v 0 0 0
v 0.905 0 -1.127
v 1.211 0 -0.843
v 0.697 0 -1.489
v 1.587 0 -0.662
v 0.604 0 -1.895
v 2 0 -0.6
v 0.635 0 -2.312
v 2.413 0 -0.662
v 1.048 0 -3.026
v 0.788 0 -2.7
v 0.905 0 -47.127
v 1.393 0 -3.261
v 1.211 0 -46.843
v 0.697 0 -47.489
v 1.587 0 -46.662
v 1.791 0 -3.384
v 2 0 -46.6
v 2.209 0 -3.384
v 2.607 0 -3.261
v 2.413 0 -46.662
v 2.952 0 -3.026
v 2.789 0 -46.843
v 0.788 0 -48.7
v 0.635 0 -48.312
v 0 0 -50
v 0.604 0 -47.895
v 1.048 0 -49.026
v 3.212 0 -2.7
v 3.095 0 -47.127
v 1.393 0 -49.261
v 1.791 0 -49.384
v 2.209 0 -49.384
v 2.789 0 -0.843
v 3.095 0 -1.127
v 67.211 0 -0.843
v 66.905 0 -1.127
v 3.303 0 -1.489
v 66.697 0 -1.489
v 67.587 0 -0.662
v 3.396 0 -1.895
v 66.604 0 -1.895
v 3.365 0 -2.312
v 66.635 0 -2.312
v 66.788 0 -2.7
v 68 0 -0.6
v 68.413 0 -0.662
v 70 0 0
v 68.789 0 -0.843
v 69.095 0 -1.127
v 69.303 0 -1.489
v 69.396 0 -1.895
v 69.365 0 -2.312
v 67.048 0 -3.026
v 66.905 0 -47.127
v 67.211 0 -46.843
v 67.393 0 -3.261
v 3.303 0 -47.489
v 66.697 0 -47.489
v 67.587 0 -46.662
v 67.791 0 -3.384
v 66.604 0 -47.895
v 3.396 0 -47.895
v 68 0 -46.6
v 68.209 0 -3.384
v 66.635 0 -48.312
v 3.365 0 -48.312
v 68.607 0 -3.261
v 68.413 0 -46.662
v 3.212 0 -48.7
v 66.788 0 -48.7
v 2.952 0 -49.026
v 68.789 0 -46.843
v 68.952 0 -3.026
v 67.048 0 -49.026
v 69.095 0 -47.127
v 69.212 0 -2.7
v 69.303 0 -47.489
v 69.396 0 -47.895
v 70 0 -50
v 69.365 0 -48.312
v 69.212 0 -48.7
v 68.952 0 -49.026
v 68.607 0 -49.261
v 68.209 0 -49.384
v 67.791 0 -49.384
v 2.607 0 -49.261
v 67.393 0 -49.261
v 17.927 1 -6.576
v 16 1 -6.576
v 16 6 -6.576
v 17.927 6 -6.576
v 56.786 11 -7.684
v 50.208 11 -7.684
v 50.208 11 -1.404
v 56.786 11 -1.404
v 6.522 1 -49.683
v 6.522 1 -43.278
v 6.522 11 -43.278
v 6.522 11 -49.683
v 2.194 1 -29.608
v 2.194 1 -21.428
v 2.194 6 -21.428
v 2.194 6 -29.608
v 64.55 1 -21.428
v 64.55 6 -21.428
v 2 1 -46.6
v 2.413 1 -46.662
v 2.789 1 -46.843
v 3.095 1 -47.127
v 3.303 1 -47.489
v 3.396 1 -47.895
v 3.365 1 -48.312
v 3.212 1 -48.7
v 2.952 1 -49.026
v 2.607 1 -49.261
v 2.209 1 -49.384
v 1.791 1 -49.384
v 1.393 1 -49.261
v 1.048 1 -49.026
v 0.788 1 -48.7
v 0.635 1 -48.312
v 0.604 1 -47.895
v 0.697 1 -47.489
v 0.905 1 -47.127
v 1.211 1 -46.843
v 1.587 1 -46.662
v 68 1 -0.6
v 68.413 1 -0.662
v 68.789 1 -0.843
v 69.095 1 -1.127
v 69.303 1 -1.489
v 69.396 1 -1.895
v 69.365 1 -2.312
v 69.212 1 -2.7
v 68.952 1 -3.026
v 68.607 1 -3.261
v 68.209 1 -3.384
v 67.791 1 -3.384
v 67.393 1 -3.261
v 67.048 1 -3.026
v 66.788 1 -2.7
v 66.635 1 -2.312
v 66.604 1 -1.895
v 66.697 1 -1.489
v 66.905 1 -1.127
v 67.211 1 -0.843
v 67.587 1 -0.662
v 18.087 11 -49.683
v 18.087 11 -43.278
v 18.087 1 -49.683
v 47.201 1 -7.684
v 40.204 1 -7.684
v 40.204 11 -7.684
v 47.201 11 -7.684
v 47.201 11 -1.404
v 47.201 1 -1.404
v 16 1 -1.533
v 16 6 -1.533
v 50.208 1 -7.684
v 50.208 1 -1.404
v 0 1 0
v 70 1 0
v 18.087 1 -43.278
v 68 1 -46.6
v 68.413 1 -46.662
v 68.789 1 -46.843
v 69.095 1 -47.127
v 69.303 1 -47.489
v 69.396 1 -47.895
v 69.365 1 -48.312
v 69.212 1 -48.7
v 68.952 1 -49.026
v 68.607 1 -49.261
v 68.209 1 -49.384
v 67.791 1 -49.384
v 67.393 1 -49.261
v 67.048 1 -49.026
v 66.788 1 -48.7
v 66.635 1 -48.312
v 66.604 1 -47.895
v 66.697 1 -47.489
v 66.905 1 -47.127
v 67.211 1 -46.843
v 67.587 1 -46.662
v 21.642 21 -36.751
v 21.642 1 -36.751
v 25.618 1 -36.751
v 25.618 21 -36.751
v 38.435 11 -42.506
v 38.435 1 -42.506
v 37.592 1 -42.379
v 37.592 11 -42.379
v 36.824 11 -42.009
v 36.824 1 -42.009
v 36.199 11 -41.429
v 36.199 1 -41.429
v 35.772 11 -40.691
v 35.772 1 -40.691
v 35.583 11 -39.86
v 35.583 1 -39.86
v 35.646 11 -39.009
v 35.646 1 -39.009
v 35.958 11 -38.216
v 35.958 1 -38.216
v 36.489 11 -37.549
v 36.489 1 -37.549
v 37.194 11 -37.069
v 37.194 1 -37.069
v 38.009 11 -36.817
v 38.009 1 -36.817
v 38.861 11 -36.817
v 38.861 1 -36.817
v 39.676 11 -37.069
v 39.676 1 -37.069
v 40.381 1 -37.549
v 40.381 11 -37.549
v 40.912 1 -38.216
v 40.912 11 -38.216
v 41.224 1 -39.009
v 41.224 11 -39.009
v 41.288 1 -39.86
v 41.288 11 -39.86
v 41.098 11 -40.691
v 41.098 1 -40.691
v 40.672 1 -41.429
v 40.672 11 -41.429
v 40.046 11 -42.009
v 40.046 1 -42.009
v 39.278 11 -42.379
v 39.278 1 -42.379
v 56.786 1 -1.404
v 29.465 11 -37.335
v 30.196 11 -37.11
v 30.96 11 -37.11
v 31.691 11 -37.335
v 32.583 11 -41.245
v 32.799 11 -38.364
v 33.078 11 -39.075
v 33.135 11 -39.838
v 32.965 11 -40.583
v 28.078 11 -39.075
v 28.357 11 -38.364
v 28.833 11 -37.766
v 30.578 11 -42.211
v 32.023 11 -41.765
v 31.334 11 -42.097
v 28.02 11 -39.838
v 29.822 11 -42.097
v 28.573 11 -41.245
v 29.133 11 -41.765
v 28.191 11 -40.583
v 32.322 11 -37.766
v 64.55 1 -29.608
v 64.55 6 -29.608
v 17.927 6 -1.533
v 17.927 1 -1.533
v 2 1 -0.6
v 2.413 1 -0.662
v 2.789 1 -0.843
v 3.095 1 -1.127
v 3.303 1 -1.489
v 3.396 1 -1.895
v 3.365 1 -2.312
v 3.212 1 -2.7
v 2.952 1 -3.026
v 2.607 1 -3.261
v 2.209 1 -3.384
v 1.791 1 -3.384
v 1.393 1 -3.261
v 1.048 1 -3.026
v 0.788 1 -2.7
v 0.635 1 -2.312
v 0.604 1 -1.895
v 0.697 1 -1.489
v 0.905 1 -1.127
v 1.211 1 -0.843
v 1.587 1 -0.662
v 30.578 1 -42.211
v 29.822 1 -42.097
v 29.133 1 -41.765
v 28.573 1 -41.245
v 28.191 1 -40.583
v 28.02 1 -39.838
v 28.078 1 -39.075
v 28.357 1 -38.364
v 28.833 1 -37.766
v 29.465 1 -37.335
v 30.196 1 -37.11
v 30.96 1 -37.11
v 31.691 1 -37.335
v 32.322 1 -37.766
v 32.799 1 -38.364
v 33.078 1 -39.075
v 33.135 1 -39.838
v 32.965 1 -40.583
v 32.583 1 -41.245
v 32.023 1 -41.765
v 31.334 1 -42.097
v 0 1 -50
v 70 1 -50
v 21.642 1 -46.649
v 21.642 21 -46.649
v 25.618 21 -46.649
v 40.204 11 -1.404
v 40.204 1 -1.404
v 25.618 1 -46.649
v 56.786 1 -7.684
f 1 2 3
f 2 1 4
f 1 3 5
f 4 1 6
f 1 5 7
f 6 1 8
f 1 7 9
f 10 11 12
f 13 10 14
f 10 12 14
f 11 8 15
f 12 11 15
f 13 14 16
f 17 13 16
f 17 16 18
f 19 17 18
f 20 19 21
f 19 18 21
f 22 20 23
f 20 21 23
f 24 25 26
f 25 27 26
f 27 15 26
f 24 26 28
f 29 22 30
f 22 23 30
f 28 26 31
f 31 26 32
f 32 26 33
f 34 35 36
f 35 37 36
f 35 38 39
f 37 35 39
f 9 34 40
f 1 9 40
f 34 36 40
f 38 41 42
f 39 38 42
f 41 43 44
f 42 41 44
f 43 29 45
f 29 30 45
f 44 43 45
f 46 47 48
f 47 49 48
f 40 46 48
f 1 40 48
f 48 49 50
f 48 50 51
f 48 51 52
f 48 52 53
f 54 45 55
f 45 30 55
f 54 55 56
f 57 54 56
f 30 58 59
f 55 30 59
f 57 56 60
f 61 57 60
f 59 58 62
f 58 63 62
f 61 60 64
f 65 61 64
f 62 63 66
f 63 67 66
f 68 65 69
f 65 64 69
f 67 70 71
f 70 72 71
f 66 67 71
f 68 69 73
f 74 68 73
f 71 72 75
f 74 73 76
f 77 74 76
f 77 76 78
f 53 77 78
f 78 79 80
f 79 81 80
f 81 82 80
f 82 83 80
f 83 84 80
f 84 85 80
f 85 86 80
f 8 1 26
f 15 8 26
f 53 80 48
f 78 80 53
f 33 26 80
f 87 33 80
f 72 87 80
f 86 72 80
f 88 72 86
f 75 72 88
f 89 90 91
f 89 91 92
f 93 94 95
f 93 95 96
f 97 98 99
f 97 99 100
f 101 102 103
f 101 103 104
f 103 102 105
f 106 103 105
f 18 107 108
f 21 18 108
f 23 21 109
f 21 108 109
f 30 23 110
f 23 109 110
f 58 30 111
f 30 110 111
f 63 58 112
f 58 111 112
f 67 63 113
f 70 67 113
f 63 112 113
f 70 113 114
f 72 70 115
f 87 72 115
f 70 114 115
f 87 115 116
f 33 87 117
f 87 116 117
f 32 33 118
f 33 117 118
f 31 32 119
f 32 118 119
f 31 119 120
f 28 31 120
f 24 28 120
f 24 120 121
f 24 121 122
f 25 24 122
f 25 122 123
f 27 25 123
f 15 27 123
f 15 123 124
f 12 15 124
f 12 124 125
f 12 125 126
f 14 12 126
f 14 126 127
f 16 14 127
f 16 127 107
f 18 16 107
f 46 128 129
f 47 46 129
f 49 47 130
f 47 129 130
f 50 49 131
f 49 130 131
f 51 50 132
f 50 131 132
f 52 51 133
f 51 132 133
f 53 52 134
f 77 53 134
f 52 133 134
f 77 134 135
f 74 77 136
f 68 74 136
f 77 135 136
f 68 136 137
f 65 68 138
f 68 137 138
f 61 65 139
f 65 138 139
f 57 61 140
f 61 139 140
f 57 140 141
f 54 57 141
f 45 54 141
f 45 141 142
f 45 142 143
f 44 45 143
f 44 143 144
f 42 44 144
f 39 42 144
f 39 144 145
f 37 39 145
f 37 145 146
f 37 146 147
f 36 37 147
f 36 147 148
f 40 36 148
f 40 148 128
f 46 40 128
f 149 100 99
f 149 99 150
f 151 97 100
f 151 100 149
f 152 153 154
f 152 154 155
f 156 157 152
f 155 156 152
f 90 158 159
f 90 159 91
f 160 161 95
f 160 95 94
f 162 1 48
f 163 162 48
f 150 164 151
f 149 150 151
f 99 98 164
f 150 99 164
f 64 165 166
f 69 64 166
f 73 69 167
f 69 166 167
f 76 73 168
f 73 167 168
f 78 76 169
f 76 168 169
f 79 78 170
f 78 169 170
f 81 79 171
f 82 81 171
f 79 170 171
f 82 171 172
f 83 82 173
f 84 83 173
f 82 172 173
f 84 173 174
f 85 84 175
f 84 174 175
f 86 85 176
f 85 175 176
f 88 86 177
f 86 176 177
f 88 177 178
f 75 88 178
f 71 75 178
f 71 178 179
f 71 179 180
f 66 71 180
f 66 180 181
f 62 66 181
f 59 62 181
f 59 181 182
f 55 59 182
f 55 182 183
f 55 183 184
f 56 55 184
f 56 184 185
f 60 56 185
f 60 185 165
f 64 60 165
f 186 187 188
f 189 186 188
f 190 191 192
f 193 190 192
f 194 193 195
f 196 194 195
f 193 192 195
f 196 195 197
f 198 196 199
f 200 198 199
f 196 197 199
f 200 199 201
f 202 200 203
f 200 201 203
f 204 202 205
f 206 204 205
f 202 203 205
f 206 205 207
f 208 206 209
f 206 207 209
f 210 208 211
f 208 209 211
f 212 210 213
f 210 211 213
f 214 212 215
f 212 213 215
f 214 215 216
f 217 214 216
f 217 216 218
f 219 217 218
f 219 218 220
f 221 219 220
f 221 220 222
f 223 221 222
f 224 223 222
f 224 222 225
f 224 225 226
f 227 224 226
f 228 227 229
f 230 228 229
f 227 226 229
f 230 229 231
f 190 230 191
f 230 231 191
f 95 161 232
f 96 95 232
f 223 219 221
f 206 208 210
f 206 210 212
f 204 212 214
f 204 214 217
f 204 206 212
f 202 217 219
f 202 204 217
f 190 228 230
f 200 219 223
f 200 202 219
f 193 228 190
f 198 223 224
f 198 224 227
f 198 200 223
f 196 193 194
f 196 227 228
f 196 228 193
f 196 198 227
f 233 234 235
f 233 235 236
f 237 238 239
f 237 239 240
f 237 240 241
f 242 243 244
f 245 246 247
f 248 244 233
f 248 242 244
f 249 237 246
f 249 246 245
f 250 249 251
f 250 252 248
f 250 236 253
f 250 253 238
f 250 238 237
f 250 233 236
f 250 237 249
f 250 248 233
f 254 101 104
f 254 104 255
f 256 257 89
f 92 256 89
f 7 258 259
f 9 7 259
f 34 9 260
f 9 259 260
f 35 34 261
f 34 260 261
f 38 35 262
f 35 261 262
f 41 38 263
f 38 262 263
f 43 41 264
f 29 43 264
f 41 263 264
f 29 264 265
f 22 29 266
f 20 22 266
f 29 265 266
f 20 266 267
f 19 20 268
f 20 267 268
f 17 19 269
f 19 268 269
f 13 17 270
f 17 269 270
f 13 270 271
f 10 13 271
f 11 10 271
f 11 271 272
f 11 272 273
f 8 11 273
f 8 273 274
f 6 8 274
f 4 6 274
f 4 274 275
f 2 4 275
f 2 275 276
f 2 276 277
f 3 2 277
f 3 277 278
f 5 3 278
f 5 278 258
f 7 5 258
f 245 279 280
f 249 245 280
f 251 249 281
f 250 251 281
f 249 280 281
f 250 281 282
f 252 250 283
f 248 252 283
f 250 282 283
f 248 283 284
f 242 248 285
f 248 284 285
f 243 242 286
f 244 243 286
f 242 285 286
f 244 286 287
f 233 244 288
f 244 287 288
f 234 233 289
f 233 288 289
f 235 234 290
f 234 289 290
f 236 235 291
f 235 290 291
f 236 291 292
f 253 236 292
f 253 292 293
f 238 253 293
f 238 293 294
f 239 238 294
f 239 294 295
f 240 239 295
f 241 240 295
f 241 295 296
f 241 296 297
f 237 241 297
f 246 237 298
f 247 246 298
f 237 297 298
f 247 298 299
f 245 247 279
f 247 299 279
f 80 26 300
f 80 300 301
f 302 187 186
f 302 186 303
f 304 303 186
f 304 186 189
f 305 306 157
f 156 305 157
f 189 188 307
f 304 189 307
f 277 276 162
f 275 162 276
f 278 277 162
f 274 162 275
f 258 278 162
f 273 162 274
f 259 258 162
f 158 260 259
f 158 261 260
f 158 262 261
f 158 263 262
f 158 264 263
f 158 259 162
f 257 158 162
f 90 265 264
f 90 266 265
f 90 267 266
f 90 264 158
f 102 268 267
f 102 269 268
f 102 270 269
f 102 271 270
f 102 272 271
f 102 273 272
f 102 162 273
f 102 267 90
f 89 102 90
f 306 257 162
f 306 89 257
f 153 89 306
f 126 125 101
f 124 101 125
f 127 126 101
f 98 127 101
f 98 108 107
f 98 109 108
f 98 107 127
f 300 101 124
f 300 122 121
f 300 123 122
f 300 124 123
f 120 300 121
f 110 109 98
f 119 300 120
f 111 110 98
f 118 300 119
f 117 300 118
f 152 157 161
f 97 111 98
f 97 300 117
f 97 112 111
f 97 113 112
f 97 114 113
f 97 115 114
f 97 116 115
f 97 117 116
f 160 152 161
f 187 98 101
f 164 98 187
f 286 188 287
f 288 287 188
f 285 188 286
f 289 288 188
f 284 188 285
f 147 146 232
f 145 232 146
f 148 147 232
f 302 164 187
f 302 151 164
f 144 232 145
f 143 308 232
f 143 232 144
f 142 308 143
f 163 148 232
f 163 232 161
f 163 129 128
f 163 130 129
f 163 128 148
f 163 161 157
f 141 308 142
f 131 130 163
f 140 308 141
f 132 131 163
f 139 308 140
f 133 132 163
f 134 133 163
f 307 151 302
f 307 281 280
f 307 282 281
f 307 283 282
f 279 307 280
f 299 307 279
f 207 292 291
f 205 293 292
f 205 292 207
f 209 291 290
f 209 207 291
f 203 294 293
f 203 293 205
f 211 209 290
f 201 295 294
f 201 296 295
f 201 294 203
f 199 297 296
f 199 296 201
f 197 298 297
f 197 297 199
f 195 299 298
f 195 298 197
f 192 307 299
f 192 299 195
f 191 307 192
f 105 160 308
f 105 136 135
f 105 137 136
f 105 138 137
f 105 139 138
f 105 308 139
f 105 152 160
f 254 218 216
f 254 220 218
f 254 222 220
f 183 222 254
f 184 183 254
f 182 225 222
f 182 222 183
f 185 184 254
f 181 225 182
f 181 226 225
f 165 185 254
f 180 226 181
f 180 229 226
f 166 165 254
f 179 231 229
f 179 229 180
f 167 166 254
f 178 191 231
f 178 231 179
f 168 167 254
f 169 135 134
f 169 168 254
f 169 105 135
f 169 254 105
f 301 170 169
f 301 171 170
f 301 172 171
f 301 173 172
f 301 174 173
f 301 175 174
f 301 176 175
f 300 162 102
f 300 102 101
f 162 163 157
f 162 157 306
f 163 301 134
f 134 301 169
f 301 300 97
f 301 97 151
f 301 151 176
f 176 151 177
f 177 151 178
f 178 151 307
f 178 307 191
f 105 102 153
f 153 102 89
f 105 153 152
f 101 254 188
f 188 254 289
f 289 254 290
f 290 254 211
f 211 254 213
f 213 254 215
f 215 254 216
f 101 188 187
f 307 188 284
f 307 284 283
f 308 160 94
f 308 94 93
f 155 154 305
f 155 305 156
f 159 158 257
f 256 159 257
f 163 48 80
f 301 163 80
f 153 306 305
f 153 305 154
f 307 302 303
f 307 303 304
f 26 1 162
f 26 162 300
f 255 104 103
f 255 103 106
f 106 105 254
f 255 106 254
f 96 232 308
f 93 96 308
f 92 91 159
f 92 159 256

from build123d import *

# Parameters (mm, degrees)
SKETCH1_W           = 70
SKETCH1_H           = 50
BOSS_EXTRUDE1_DEPTH = 1
SKETCH2_R           = 1.4
CUT_EXTRUDE1_DEPTH  = 87.029064856
SKETCH3_R           = 2.564653552
SKETCH3_R_2         = 2.860541453
SKETCH3_W           = 6.997065393
SKETCH3_H           = 6.279852664
SKETCH3_W_2         = 6.578665668
SKETCH3_W_3         = 11.565083488
SKETCH3_H_2         = 6.404713395
BOSS_EXTRUDE2_DEPTH = 10
SKETCH5_W           = 62.355948398
SKETCH5_H           = 8.179994237
SKETCH5_W_2         = 1.926807787
SKETCH5_H_2         = 5.042884886
BOSS_EXTRUDE3_DEPTH = 5
SKETCH6_W           = 3.975602045
SKETCH6_H           = 9.897897773
BOSS_EXTRUDE4_DEPTH = 20


with BuildPart() as part:
    # Sketch1 → Boss-Extrude1 (new body)
    with BuildSketch(Plane(origin=(0, 0, 0), x_dir=(1, 0, 0), z_dir=(0, 1, 0))):
        with Locations((35, 25)):
            Rectangle(SKETCH1_W, SKETCH1_H)
    extrude(amount=BOSS_EXTRUDE1_DEPTH)

    # Sketch2 → Cut-Extrude1 (cut, through all)
    with BuildSketch(Plane(origin=(0, 1, 0), x_dir=(1, 0, 0), z_dir=(0, 1, 0))):
        with Locations(Location((2, 48, 0), (0, 0, 270))):
            Circle(SKETCH2_R)
        with Locations(Location((68, 48, 0), (0, 0, 270))):
            Circle(SKETCH2_R)
        with Locations(Location((68, 2, 0), (0, 0, 270))):
            Circle(SKETCH2_R)
        with Locations(Location((2, 2, 0), (0, 0, 270))):
            Circle(SKETCH2_R)
    extrude(amount=-CUT_EXTRUDE1_DEPTH, mode=Mode.SUBTRACT)

    # Sketch3 → Boss-Extrude2 (add)
    with BuildSketch(Plane(origin=(0, 1, 0), x_dir=(1, 0, 0), z_dir=(0, 1, 0))):
        with Locations(Location((30.577880589, 39.645889027, 0), (0, 0, 90))):
            Circle(SKETCH3_R)
        with Locations(Location((38.435044471, 39.645889027, 0), (0, 0, 90))):
            Circle(SKETCH3_R_2)
        with Locations((43.70288795, 4.543658094)):
            Rectangle(SKETCH3_W, SKETCH3_H)
        with Locations((53.497105797, 4.543658094)):
            Rectangle(SKETCH3_W_2, SKETCH3_H)
        with Locations((12.304871688, 46.48029873)):
            Rectangle(SKETCH3_W_3, SKETCH3_H_2)
    extrude(amount=BOSS_EXTRUDE2_DEPTH)

    # Sketch5 → Boss-Extrude3 (add)
    with BuildSketch(Plane(origin=(0, 1, 0), x_dir=(1, 0, 0), z_dir=(0, 1, 0))):
        with Locations((33.371807315, 25.517900554)):
            Rectangle(SKETCH5_W, SKETCH5_H)
        with Locations((16.963761322, 4.054342187)):
            Rectangle(SKETCH5_W_2, SKETCH5_H_2)
    extrude(amount=BOSS_EXTRUDE3_DEPTH)

    # Sketch6 → Boss-Extrude4 (add)
    with BuildSketch(Plane(origin=(0, 1, 0), x_dir=(1, 0, 0), z_dir=(0, 1, 0))):
        with Locations((23.62978258, 41.700410586)):
            Rectangle(SKETCH6_W, SKETCH6_H)
    extrude(amount=BOSS_EXTRUDE4_DEPTH)


solid = part.part
